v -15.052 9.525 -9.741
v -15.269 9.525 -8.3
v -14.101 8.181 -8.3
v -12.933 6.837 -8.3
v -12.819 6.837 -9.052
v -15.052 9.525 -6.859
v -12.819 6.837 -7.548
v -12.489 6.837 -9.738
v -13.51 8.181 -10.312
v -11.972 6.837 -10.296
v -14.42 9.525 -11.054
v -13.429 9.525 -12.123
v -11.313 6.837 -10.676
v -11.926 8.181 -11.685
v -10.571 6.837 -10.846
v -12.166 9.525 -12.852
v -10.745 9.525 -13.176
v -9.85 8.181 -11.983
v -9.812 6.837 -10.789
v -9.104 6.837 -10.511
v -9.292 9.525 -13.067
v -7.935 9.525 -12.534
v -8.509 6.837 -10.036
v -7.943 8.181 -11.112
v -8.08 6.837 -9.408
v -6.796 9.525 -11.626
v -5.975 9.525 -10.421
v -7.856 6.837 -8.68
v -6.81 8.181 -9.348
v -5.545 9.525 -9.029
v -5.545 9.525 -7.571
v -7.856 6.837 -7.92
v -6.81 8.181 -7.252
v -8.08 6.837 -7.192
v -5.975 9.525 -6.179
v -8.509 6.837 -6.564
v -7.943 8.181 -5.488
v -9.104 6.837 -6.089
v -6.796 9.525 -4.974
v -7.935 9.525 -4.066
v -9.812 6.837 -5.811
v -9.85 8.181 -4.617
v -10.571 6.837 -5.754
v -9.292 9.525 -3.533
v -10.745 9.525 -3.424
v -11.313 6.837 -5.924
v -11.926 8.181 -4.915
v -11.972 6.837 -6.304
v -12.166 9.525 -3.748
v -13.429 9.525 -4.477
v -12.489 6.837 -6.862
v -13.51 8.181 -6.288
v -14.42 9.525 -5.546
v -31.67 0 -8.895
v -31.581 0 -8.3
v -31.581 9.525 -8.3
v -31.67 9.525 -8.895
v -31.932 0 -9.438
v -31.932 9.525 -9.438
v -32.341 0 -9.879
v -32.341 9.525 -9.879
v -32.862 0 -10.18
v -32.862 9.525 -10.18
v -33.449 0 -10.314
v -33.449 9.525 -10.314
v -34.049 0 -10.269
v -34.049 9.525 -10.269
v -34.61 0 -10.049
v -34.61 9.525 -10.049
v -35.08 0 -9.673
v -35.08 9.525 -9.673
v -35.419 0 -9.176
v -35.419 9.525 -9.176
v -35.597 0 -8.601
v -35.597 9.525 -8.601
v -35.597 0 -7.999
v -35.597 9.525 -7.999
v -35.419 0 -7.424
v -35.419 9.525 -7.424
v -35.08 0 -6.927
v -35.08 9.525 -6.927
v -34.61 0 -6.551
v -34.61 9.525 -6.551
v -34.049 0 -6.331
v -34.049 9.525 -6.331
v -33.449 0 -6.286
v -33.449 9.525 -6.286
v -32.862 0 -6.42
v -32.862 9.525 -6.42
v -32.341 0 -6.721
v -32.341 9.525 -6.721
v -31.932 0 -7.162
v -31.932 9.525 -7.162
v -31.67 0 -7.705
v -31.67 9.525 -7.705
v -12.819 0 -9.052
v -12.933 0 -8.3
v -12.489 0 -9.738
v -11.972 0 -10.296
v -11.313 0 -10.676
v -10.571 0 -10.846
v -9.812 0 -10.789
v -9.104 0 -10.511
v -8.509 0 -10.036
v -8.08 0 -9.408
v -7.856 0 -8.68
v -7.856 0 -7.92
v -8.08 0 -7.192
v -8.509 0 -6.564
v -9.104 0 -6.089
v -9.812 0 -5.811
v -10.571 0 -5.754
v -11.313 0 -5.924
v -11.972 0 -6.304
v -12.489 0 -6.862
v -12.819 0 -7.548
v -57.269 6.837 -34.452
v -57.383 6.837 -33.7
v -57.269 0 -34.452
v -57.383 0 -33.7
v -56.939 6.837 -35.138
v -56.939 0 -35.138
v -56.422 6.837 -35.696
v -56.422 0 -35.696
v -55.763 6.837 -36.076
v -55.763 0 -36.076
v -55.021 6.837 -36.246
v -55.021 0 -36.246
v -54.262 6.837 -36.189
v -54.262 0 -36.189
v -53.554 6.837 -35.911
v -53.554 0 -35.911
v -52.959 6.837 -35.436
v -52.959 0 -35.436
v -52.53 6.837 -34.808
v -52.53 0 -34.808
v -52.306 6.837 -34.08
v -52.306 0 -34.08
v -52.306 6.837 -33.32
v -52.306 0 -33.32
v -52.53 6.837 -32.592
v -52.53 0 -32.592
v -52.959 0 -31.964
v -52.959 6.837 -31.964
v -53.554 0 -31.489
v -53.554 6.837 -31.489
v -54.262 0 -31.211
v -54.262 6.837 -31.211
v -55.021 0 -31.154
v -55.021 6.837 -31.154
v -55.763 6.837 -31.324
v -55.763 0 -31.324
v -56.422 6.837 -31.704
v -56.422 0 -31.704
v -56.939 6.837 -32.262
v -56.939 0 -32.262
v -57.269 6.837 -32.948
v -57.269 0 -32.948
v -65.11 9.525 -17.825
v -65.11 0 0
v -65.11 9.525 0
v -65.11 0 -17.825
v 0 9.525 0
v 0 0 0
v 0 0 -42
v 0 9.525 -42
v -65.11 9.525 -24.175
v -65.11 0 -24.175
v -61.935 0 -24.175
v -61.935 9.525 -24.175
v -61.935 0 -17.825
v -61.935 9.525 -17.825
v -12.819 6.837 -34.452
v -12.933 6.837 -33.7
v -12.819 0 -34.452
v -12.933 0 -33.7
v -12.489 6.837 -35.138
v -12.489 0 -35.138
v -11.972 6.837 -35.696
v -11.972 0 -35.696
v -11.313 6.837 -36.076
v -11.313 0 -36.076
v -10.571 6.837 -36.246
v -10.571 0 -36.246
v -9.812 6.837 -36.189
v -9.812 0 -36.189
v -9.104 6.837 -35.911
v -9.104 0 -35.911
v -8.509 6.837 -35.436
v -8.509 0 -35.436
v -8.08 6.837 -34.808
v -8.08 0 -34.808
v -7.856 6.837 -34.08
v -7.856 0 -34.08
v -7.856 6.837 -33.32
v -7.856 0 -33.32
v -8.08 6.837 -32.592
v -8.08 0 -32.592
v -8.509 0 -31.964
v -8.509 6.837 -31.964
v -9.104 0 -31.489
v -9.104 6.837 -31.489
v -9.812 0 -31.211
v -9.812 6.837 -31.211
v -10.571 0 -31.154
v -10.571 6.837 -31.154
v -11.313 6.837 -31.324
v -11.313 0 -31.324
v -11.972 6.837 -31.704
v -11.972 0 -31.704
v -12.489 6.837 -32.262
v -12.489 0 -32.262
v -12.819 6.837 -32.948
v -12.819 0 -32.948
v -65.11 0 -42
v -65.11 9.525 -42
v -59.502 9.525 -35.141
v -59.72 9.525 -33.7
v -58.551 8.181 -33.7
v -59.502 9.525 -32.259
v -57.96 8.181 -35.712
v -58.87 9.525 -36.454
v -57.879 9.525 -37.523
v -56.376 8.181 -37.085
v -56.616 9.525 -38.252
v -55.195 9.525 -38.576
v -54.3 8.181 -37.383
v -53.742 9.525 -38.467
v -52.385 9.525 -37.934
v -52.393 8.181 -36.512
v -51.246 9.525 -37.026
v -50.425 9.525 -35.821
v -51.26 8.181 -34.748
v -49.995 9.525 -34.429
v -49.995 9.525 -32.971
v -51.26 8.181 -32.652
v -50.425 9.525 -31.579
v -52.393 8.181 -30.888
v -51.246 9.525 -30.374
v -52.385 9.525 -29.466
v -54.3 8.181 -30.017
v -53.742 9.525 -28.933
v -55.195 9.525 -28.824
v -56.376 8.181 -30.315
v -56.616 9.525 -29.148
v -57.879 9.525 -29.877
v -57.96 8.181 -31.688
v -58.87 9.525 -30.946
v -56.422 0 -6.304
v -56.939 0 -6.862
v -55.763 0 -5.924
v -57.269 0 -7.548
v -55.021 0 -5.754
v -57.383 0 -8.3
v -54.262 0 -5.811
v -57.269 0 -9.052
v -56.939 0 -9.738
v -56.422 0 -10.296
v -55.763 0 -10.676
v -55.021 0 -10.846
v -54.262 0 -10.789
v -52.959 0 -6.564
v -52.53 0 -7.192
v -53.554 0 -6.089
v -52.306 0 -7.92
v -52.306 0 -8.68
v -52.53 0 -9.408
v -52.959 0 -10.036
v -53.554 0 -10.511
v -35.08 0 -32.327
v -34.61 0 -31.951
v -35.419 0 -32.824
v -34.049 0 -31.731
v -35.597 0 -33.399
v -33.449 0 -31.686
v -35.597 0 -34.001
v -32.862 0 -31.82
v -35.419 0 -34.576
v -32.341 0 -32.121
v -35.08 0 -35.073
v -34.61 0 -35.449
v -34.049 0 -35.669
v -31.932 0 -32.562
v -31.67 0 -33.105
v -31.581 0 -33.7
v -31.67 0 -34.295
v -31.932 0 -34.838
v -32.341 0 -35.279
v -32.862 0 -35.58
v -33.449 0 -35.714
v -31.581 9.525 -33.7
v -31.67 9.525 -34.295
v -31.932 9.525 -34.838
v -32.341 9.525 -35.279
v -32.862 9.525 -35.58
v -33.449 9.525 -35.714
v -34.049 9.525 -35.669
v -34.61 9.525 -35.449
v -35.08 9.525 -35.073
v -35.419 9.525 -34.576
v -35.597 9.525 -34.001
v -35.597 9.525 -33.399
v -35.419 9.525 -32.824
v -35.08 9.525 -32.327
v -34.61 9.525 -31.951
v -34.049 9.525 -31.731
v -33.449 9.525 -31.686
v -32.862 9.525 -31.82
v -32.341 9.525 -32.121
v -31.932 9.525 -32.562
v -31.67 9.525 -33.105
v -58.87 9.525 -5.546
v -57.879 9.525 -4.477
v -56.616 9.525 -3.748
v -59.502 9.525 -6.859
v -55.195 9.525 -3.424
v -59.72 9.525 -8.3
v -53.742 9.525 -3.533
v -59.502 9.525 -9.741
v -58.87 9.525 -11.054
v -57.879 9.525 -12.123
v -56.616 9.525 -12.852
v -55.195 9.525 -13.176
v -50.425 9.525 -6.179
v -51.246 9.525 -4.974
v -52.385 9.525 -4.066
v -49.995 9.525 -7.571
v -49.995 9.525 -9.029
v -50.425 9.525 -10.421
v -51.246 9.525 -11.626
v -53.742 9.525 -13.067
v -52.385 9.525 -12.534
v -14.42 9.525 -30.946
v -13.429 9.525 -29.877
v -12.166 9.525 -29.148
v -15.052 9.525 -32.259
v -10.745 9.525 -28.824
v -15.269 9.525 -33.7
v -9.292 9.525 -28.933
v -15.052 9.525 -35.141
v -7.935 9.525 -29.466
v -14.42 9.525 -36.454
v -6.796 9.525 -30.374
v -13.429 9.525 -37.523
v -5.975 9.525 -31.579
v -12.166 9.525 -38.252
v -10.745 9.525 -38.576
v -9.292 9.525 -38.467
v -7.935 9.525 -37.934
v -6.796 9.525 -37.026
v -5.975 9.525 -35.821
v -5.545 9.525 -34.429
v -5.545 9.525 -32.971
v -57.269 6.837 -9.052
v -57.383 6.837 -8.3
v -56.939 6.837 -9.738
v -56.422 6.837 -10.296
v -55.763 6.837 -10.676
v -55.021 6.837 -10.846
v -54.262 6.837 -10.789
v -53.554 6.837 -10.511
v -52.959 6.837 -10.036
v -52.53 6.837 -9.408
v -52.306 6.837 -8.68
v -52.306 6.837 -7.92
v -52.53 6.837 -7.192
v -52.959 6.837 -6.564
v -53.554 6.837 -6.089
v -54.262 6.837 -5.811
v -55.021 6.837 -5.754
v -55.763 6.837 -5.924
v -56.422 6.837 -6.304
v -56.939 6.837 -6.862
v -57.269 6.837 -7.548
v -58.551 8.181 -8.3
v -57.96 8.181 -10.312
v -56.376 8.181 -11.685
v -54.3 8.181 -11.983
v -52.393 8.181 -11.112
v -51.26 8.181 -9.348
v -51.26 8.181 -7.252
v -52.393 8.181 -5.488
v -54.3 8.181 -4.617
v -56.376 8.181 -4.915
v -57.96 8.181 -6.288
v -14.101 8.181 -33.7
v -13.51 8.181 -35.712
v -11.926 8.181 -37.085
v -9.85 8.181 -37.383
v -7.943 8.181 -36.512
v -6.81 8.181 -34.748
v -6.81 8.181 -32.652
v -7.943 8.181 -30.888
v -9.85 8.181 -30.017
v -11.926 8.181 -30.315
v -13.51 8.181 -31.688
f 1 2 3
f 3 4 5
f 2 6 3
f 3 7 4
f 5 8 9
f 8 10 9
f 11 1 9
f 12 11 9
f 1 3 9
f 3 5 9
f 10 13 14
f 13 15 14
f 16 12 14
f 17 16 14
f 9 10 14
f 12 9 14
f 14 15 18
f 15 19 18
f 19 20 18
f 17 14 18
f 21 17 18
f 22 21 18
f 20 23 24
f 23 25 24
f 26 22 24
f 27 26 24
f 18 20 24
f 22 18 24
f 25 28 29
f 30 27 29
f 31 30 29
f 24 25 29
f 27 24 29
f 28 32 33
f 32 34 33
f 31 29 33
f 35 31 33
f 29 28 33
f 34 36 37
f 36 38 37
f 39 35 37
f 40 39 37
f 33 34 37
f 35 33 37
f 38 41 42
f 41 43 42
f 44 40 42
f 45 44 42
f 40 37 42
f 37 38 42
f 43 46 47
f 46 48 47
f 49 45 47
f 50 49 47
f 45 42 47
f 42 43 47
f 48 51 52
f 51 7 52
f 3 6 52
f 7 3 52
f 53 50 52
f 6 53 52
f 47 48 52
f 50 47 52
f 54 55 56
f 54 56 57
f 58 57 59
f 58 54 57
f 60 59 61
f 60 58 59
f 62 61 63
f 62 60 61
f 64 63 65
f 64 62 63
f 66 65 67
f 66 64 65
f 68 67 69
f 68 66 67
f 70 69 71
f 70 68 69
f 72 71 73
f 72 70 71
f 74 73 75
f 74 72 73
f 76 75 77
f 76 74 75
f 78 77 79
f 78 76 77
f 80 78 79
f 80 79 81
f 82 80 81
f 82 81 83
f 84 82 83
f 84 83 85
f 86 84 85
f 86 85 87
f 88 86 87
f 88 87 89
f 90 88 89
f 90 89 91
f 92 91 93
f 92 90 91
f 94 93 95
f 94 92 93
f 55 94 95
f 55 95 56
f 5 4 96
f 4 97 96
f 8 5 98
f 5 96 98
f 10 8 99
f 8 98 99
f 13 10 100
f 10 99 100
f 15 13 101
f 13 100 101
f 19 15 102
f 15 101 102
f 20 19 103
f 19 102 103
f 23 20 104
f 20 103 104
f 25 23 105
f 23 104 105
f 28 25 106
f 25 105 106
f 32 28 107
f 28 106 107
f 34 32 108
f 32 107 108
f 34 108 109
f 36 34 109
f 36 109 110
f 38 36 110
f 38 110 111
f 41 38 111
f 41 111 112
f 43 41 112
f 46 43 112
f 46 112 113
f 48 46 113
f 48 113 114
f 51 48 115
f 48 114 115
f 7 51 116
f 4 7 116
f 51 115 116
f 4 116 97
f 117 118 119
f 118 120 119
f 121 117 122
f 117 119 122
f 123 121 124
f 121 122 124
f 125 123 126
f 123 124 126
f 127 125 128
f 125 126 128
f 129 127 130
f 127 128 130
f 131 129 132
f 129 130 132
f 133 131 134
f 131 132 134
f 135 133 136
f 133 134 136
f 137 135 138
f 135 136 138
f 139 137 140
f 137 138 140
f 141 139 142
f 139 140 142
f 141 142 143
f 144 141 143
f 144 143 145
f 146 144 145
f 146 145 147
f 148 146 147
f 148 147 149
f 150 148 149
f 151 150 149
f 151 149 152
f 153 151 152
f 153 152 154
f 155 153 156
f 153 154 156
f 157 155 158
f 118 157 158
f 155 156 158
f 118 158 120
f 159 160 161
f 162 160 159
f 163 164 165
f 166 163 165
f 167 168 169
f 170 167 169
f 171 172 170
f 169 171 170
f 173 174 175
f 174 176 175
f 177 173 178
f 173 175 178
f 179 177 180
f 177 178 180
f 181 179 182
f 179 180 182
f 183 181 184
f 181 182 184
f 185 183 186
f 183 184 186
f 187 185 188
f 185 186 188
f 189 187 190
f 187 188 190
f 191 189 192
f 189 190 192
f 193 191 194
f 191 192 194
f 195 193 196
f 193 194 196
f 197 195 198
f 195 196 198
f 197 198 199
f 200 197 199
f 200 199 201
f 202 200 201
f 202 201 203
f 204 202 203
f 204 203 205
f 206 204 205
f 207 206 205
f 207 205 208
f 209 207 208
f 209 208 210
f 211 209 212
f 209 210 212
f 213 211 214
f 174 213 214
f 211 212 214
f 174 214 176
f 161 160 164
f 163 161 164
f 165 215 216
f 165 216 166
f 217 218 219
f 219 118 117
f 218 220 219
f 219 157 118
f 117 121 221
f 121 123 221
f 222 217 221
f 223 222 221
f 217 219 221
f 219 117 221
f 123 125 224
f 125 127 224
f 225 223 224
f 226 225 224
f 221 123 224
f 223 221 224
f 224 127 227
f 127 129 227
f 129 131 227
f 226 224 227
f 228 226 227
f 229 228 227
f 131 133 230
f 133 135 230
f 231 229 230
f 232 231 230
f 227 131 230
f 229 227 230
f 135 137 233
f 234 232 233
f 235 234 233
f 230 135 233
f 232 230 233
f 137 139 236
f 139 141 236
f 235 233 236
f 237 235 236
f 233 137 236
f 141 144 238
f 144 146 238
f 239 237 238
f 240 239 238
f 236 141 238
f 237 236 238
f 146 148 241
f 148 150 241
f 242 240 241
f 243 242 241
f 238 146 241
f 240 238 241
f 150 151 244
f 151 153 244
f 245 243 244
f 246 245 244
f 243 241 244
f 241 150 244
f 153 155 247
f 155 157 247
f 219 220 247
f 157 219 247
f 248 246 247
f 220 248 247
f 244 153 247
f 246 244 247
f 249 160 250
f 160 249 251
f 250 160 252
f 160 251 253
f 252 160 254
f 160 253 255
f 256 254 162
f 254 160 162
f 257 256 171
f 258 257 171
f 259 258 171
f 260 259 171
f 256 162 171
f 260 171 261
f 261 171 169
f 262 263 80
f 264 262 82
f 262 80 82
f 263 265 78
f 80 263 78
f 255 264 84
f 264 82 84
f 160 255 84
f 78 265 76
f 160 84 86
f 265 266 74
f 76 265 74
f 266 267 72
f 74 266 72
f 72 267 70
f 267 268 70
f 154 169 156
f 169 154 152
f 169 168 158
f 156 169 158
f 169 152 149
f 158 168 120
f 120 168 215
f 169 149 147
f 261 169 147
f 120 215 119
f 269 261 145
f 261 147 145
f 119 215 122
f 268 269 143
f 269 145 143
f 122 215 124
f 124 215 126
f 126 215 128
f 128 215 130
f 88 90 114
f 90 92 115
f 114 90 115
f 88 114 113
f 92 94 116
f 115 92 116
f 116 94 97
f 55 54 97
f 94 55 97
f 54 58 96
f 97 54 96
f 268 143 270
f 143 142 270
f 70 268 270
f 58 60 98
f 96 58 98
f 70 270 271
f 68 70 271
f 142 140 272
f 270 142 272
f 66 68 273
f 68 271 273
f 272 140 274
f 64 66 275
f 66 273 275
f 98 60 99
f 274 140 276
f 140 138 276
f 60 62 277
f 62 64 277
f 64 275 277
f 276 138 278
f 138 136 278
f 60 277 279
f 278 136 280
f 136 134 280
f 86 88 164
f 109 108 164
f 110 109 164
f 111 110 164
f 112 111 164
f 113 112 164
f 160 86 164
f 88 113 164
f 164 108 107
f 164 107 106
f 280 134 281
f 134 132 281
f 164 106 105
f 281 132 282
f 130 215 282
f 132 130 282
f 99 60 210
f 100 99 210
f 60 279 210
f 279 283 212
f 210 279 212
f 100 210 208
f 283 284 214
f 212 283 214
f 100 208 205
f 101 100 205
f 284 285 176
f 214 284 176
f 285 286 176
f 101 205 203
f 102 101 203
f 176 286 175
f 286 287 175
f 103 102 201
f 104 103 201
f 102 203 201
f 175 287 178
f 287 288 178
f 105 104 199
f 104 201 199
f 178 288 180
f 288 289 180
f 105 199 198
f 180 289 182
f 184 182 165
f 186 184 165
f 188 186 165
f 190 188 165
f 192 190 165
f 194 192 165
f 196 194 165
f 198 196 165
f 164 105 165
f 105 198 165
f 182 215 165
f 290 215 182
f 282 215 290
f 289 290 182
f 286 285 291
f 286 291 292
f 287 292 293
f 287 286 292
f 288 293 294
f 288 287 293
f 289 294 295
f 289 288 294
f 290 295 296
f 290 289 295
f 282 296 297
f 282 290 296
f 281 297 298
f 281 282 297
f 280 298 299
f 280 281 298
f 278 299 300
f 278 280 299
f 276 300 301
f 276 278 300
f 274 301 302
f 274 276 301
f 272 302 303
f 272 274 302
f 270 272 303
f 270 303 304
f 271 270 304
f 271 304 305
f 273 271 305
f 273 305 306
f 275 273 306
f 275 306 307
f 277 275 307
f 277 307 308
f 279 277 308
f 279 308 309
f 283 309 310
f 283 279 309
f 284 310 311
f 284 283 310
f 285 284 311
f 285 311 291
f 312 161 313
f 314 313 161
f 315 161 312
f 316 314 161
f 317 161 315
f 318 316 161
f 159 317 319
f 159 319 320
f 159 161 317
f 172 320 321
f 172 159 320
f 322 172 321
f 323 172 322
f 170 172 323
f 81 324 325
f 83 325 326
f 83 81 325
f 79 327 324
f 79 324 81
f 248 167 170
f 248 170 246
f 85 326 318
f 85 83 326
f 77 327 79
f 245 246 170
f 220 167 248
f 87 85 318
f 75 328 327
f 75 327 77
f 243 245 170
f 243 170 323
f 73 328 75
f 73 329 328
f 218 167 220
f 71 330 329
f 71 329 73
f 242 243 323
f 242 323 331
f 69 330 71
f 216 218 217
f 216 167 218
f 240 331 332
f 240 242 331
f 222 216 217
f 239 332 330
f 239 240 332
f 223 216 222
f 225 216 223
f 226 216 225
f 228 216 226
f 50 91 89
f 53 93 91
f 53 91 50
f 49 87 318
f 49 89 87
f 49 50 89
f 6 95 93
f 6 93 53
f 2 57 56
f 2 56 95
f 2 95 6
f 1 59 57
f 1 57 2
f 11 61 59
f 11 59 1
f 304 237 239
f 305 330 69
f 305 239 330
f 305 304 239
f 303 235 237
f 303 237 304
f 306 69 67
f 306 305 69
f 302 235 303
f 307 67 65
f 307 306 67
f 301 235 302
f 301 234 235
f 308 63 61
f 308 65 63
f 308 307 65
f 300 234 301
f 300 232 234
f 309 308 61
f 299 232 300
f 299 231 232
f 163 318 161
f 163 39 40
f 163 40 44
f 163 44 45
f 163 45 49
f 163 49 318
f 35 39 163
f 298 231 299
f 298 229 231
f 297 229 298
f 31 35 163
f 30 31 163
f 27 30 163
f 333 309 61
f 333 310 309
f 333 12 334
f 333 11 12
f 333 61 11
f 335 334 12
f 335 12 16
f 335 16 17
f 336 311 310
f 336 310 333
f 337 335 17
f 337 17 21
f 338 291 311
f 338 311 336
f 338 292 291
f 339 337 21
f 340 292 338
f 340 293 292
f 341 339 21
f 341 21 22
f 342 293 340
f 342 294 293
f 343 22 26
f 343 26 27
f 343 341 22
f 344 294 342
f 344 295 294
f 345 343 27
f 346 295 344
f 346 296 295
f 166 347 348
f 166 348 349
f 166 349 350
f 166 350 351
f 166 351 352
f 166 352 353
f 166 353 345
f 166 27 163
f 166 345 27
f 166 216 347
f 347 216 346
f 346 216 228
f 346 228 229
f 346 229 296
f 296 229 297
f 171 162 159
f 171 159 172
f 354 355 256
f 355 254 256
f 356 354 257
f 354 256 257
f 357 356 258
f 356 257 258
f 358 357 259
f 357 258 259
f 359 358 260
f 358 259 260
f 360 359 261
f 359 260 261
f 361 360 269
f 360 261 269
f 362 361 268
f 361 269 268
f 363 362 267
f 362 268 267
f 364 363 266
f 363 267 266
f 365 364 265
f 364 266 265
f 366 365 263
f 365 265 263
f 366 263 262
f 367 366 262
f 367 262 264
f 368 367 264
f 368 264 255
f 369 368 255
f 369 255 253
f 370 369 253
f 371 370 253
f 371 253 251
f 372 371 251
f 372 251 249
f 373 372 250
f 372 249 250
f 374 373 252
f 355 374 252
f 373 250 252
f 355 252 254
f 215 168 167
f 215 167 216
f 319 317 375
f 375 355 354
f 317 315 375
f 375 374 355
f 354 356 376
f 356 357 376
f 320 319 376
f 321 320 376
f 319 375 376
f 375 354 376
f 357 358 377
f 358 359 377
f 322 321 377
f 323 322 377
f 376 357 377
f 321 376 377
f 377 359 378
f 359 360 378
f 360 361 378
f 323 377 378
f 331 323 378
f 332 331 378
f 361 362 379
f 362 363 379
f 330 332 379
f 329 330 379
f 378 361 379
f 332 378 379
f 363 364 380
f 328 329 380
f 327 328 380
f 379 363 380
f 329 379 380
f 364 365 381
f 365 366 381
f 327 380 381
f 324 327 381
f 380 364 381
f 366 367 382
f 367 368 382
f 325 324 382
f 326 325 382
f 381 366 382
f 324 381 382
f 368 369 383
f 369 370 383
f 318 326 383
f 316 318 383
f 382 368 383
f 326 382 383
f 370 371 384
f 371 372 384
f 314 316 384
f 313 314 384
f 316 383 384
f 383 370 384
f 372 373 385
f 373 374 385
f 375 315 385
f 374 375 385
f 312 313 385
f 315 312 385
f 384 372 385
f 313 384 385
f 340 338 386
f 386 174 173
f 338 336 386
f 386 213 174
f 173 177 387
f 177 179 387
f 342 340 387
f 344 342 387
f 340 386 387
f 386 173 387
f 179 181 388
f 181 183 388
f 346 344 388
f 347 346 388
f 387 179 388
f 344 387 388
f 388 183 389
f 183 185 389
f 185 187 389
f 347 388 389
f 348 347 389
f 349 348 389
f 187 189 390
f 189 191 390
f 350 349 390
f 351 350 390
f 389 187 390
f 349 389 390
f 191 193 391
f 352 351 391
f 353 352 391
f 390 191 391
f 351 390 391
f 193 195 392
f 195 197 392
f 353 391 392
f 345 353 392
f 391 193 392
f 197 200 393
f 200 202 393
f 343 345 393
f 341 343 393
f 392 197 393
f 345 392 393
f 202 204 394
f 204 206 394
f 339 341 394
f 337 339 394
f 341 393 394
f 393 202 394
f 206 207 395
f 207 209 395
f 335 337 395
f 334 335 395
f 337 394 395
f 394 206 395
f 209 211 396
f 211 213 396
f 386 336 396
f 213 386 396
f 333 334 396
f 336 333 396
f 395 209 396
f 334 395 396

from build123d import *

# Parameters (mm, degrees)
SKETCH2_W                                       = 65.110000082
SKETCH2_H                                       = 42
BOSS_EXTRUDE1_DEPTH                             = 9.525
CSK_FOR_10_FLAT_HEAD_MACHINE_SCREW1_D           = 5.1054
CSK_FOR_10_FLAT_HEAD_MACHINE_SCREW1_CSINK_D     = 9.779
CSK_FOR_10_FLAT_HEAD_MACHINE_SCREW1_CSINK_ANGLE = 82
SKETCH15_W                                      = 3.175
SKETCH15_H                                      = 6.35
CUT_EXTRUDE1_DEPTH                              = 79.064317942
ADVANCEDHOLE2_OUTLINE_R                         = 2.0193
ADVANCEDHOLE2_DEPTH                             = 9.525


# Read off the part's stored shape, not the designer's step: AdvancedHole2
with BuildPart() as part:
    # Sketch2 → Boss-Extrude1 (new body)
    with BuildSketch(Plane(origin=(0, 0, 0), x_dir=(1, 0, 0), z_dir=(0, 1, 0))):
        with Locations((-32.555000041, 21)):
            Rectangle(SKETCH2_W, SKETCH2_H)
    extrude(amount=BOSS_EXTRUDE1_DEPTH)

    # CSK for #10 Flat Head Machine Screw1 (through all)
    with Locations(Plane(origin=(0, 9.525, 0), x_dir=(1, 0, 0), z_dir=(0, 1, 0))):
        with Locations((-54.830000082, 33.7), (-54.830000082, 8.3), (-10.3799894, 8.3), (-10.3799894, 33.7)):
            CounterSinkHole(CSK_FOR_10_FLAT_HEAD_MACHINE_SCREW1_D / 2, CSK_FOR_10_FLAT_HEAD_MACHINE_SCREW1_CSINK_D / 2, counter_sink_angle=CSK_FOR_10_FLAT_HEAD_MACHINE_SCREW1_CSINK_ANGLE)

    # Sketch15 → Cut-Extrude1 (cut, through all)
    with BuildSketch(Plane(origin=(0, 9.525, 0), x_dir=(1, 0, 0), z_dir=(0, 1, 0))):
        with Locations((-63.522500082, 21)):
            Rectangle(SKETCH15_W, SKETCH15_H)
    extrude(amount=-CUT_EXTRUDE1_DEPTH, mode=Mode.SUBTRACT)

    # AdvancedHole2 outline → AdvancedHole2 (cut)
    with BuildSketch(Plane(origin=(0, 0, 0), x_dir=(1, 0, 0), z_dir=(0, 1, 0))):
        with Locations((-33.600000082, 8.3)):
            Circle(ADVANCEDHOLE2_OUTLINE_R)
        with Locations((-33.600000082, 33.7)):
            Circle(ADVANCEDHOLE2_OUTLINE_R)
    extrude(amount=ADVANCEDHOLE2_DEPTH, mode=Mode.SUBTRACT)


solid = part.part
